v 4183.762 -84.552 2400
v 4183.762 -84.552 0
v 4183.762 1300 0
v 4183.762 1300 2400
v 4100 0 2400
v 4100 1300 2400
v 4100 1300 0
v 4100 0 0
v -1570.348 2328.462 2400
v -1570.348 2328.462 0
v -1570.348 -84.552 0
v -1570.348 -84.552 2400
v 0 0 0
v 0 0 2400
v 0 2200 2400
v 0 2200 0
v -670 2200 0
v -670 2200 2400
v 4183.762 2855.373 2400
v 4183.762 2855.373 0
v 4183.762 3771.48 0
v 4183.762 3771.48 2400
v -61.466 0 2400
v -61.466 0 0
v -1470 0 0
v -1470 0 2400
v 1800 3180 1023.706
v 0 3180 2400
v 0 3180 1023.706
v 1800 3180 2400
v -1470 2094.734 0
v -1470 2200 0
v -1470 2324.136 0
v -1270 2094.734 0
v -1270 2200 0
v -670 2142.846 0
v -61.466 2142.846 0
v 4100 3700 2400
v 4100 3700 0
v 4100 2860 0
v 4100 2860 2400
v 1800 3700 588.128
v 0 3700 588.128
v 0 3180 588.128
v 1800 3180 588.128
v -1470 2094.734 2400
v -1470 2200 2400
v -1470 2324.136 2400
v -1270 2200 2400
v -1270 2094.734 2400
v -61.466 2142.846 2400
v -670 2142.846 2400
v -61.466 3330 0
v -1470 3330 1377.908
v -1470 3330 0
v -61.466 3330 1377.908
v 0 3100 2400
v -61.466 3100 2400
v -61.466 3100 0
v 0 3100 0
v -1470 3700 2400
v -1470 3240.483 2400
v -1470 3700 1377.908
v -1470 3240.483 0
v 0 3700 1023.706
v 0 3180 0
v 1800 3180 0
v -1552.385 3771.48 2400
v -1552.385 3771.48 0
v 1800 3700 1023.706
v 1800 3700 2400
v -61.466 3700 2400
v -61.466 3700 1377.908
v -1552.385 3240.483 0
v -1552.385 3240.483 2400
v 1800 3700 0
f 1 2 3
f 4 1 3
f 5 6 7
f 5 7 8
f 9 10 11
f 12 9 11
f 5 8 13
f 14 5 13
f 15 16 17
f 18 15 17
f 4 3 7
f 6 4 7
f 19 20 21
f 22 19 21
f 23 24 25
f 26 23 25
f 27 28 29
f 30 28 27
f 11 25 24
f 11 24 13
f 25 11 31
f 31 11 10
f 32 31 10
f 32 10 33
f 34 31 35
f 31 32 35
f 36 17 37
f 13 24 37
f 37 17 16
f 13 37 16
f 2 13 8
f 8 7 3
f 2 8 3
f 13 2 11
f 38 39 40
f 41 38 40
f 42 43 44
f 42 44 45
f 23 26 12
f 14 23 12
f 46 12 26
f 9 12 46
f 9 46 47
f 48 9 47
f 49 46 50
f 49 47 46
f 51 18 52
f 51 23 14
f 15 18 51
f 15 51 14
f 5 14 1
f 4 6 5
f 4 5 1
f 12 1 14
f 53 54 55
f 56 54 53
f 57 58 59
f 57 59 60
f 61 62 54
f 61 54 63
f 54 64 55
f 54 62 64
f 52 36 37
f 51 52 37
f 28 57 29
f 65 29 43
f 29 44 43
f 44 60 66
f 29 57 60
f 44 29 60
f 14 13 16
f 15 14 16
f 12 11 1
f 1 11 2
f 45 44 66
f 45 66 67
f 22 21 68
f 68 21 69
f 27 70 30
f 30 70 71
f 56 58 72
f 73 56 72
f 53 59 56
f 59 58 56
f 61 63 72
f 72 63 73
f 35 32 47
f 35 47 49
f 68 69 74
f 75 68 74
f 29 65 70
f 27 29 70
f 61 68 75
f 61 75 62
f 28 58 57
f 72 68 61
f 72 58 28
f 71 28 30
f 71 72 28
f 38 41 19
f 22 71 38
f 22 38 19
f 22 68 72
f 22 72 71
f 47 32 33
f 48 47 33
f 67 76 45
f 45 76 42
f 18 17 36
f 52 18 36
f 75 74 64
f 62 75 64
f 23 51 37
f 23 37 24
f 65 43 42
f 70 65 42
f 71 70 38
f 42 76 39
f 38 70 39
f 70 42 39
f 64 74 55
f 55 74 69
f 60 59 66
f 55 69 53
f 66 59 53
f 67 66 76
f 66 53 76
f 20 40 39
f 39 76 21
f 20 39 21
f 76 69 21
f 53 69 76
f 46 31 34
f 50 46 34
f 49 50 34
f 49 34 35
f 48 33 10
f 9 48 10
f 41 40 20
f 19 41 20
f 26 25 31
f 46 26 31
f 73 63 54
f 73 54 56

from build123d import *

# Parameters (mm, degrees)
F0_W     = 200
F0_H     = 105.2655696869
F1_DEPTH = 2400
F0_W_2   = 61.4657178521
F0_H_2   = 600
F2_W     = 1800
F2_H     = 588.1278291095
F2_H_2   = 1376.2938022614
F3_DEPTH = 520
F4_W     = 1408.5342821479
F4_H     = 1377.9084682465
F5_DEPTH = 370


with BuildPart() as f1:
    # F0 (on Top) → F1 (new body)
    with BuildSketch(Plane.XY):
        Polygon((-61.4657178521, 0), (0, 0), (0, 2200), (-670, 2200), (-670, 2142.8458690643), (-61.4657178521, 2142.8458690643), align=None)
        Polygon((4100, 0), (0, 0), (-61.4657178521, 0), (-1470, 0), (-1470, 2094.7344303131), (-1470, 2200), (-1470, 2324.1364955902), (-1570.3476667404, 2328.4621238708), (-1570.3476667404, -84.5517069101), (4183.7620735168, -84.5517069101), (4183.7620735168, 1300), (4100, 1300), align=None)
        with Locations((-1370, 2147.3672151566)):
            Rectangle(F0_W, F0_H)
    extrude(amount=F1_DEPTH)


with BuildPart() as f1b:
    # F0 (on Top) → F1, piece 2 (new body)
    with BuildSketch(Plane.XY):
        Polygon((4100, 3700), (4100, 2860), (4183.7620735168, 2855.3731441498), (4183.7620735168, 3771.4800834656), (-1552.3847341537, 3771.4800834656), (-1552.3847341537, 3240.4828071594), (-1470, 3240.4828071594), (-1470, 3700), (-61.4657178521, 3700), (0, 3700), (1800, 3700), align=None)
        with Locations((-30.7328589261, 3400)):
            Rectangle(F0_W_2, F0_H_2)
    extrude(amount=F1_DEPTH)

    # F2 (on face) → F3 (join)
    with BuildSketch(Plane.XZ.offset(-3700)):
        with Locations((900, 294.0639145548)):
            Rectangle(F2_W, F2_H)
        with Locations((900, 1711.8530988693)):
            Rectangle(F2_W, F2_H_2)
    extrude(amount=F3_DEPTH)

    # F4 (on face) → F5 (join)
    with BuildSketch(Plane.XZ.offset(-3700)):
        with Locations((-765.7328589261, 688.9542341232)):
            Rectangle(F4_W, F4_H)
    extrude(amount=F5_DEPTH)


solid = Compound([f1.part, f1b.part])
